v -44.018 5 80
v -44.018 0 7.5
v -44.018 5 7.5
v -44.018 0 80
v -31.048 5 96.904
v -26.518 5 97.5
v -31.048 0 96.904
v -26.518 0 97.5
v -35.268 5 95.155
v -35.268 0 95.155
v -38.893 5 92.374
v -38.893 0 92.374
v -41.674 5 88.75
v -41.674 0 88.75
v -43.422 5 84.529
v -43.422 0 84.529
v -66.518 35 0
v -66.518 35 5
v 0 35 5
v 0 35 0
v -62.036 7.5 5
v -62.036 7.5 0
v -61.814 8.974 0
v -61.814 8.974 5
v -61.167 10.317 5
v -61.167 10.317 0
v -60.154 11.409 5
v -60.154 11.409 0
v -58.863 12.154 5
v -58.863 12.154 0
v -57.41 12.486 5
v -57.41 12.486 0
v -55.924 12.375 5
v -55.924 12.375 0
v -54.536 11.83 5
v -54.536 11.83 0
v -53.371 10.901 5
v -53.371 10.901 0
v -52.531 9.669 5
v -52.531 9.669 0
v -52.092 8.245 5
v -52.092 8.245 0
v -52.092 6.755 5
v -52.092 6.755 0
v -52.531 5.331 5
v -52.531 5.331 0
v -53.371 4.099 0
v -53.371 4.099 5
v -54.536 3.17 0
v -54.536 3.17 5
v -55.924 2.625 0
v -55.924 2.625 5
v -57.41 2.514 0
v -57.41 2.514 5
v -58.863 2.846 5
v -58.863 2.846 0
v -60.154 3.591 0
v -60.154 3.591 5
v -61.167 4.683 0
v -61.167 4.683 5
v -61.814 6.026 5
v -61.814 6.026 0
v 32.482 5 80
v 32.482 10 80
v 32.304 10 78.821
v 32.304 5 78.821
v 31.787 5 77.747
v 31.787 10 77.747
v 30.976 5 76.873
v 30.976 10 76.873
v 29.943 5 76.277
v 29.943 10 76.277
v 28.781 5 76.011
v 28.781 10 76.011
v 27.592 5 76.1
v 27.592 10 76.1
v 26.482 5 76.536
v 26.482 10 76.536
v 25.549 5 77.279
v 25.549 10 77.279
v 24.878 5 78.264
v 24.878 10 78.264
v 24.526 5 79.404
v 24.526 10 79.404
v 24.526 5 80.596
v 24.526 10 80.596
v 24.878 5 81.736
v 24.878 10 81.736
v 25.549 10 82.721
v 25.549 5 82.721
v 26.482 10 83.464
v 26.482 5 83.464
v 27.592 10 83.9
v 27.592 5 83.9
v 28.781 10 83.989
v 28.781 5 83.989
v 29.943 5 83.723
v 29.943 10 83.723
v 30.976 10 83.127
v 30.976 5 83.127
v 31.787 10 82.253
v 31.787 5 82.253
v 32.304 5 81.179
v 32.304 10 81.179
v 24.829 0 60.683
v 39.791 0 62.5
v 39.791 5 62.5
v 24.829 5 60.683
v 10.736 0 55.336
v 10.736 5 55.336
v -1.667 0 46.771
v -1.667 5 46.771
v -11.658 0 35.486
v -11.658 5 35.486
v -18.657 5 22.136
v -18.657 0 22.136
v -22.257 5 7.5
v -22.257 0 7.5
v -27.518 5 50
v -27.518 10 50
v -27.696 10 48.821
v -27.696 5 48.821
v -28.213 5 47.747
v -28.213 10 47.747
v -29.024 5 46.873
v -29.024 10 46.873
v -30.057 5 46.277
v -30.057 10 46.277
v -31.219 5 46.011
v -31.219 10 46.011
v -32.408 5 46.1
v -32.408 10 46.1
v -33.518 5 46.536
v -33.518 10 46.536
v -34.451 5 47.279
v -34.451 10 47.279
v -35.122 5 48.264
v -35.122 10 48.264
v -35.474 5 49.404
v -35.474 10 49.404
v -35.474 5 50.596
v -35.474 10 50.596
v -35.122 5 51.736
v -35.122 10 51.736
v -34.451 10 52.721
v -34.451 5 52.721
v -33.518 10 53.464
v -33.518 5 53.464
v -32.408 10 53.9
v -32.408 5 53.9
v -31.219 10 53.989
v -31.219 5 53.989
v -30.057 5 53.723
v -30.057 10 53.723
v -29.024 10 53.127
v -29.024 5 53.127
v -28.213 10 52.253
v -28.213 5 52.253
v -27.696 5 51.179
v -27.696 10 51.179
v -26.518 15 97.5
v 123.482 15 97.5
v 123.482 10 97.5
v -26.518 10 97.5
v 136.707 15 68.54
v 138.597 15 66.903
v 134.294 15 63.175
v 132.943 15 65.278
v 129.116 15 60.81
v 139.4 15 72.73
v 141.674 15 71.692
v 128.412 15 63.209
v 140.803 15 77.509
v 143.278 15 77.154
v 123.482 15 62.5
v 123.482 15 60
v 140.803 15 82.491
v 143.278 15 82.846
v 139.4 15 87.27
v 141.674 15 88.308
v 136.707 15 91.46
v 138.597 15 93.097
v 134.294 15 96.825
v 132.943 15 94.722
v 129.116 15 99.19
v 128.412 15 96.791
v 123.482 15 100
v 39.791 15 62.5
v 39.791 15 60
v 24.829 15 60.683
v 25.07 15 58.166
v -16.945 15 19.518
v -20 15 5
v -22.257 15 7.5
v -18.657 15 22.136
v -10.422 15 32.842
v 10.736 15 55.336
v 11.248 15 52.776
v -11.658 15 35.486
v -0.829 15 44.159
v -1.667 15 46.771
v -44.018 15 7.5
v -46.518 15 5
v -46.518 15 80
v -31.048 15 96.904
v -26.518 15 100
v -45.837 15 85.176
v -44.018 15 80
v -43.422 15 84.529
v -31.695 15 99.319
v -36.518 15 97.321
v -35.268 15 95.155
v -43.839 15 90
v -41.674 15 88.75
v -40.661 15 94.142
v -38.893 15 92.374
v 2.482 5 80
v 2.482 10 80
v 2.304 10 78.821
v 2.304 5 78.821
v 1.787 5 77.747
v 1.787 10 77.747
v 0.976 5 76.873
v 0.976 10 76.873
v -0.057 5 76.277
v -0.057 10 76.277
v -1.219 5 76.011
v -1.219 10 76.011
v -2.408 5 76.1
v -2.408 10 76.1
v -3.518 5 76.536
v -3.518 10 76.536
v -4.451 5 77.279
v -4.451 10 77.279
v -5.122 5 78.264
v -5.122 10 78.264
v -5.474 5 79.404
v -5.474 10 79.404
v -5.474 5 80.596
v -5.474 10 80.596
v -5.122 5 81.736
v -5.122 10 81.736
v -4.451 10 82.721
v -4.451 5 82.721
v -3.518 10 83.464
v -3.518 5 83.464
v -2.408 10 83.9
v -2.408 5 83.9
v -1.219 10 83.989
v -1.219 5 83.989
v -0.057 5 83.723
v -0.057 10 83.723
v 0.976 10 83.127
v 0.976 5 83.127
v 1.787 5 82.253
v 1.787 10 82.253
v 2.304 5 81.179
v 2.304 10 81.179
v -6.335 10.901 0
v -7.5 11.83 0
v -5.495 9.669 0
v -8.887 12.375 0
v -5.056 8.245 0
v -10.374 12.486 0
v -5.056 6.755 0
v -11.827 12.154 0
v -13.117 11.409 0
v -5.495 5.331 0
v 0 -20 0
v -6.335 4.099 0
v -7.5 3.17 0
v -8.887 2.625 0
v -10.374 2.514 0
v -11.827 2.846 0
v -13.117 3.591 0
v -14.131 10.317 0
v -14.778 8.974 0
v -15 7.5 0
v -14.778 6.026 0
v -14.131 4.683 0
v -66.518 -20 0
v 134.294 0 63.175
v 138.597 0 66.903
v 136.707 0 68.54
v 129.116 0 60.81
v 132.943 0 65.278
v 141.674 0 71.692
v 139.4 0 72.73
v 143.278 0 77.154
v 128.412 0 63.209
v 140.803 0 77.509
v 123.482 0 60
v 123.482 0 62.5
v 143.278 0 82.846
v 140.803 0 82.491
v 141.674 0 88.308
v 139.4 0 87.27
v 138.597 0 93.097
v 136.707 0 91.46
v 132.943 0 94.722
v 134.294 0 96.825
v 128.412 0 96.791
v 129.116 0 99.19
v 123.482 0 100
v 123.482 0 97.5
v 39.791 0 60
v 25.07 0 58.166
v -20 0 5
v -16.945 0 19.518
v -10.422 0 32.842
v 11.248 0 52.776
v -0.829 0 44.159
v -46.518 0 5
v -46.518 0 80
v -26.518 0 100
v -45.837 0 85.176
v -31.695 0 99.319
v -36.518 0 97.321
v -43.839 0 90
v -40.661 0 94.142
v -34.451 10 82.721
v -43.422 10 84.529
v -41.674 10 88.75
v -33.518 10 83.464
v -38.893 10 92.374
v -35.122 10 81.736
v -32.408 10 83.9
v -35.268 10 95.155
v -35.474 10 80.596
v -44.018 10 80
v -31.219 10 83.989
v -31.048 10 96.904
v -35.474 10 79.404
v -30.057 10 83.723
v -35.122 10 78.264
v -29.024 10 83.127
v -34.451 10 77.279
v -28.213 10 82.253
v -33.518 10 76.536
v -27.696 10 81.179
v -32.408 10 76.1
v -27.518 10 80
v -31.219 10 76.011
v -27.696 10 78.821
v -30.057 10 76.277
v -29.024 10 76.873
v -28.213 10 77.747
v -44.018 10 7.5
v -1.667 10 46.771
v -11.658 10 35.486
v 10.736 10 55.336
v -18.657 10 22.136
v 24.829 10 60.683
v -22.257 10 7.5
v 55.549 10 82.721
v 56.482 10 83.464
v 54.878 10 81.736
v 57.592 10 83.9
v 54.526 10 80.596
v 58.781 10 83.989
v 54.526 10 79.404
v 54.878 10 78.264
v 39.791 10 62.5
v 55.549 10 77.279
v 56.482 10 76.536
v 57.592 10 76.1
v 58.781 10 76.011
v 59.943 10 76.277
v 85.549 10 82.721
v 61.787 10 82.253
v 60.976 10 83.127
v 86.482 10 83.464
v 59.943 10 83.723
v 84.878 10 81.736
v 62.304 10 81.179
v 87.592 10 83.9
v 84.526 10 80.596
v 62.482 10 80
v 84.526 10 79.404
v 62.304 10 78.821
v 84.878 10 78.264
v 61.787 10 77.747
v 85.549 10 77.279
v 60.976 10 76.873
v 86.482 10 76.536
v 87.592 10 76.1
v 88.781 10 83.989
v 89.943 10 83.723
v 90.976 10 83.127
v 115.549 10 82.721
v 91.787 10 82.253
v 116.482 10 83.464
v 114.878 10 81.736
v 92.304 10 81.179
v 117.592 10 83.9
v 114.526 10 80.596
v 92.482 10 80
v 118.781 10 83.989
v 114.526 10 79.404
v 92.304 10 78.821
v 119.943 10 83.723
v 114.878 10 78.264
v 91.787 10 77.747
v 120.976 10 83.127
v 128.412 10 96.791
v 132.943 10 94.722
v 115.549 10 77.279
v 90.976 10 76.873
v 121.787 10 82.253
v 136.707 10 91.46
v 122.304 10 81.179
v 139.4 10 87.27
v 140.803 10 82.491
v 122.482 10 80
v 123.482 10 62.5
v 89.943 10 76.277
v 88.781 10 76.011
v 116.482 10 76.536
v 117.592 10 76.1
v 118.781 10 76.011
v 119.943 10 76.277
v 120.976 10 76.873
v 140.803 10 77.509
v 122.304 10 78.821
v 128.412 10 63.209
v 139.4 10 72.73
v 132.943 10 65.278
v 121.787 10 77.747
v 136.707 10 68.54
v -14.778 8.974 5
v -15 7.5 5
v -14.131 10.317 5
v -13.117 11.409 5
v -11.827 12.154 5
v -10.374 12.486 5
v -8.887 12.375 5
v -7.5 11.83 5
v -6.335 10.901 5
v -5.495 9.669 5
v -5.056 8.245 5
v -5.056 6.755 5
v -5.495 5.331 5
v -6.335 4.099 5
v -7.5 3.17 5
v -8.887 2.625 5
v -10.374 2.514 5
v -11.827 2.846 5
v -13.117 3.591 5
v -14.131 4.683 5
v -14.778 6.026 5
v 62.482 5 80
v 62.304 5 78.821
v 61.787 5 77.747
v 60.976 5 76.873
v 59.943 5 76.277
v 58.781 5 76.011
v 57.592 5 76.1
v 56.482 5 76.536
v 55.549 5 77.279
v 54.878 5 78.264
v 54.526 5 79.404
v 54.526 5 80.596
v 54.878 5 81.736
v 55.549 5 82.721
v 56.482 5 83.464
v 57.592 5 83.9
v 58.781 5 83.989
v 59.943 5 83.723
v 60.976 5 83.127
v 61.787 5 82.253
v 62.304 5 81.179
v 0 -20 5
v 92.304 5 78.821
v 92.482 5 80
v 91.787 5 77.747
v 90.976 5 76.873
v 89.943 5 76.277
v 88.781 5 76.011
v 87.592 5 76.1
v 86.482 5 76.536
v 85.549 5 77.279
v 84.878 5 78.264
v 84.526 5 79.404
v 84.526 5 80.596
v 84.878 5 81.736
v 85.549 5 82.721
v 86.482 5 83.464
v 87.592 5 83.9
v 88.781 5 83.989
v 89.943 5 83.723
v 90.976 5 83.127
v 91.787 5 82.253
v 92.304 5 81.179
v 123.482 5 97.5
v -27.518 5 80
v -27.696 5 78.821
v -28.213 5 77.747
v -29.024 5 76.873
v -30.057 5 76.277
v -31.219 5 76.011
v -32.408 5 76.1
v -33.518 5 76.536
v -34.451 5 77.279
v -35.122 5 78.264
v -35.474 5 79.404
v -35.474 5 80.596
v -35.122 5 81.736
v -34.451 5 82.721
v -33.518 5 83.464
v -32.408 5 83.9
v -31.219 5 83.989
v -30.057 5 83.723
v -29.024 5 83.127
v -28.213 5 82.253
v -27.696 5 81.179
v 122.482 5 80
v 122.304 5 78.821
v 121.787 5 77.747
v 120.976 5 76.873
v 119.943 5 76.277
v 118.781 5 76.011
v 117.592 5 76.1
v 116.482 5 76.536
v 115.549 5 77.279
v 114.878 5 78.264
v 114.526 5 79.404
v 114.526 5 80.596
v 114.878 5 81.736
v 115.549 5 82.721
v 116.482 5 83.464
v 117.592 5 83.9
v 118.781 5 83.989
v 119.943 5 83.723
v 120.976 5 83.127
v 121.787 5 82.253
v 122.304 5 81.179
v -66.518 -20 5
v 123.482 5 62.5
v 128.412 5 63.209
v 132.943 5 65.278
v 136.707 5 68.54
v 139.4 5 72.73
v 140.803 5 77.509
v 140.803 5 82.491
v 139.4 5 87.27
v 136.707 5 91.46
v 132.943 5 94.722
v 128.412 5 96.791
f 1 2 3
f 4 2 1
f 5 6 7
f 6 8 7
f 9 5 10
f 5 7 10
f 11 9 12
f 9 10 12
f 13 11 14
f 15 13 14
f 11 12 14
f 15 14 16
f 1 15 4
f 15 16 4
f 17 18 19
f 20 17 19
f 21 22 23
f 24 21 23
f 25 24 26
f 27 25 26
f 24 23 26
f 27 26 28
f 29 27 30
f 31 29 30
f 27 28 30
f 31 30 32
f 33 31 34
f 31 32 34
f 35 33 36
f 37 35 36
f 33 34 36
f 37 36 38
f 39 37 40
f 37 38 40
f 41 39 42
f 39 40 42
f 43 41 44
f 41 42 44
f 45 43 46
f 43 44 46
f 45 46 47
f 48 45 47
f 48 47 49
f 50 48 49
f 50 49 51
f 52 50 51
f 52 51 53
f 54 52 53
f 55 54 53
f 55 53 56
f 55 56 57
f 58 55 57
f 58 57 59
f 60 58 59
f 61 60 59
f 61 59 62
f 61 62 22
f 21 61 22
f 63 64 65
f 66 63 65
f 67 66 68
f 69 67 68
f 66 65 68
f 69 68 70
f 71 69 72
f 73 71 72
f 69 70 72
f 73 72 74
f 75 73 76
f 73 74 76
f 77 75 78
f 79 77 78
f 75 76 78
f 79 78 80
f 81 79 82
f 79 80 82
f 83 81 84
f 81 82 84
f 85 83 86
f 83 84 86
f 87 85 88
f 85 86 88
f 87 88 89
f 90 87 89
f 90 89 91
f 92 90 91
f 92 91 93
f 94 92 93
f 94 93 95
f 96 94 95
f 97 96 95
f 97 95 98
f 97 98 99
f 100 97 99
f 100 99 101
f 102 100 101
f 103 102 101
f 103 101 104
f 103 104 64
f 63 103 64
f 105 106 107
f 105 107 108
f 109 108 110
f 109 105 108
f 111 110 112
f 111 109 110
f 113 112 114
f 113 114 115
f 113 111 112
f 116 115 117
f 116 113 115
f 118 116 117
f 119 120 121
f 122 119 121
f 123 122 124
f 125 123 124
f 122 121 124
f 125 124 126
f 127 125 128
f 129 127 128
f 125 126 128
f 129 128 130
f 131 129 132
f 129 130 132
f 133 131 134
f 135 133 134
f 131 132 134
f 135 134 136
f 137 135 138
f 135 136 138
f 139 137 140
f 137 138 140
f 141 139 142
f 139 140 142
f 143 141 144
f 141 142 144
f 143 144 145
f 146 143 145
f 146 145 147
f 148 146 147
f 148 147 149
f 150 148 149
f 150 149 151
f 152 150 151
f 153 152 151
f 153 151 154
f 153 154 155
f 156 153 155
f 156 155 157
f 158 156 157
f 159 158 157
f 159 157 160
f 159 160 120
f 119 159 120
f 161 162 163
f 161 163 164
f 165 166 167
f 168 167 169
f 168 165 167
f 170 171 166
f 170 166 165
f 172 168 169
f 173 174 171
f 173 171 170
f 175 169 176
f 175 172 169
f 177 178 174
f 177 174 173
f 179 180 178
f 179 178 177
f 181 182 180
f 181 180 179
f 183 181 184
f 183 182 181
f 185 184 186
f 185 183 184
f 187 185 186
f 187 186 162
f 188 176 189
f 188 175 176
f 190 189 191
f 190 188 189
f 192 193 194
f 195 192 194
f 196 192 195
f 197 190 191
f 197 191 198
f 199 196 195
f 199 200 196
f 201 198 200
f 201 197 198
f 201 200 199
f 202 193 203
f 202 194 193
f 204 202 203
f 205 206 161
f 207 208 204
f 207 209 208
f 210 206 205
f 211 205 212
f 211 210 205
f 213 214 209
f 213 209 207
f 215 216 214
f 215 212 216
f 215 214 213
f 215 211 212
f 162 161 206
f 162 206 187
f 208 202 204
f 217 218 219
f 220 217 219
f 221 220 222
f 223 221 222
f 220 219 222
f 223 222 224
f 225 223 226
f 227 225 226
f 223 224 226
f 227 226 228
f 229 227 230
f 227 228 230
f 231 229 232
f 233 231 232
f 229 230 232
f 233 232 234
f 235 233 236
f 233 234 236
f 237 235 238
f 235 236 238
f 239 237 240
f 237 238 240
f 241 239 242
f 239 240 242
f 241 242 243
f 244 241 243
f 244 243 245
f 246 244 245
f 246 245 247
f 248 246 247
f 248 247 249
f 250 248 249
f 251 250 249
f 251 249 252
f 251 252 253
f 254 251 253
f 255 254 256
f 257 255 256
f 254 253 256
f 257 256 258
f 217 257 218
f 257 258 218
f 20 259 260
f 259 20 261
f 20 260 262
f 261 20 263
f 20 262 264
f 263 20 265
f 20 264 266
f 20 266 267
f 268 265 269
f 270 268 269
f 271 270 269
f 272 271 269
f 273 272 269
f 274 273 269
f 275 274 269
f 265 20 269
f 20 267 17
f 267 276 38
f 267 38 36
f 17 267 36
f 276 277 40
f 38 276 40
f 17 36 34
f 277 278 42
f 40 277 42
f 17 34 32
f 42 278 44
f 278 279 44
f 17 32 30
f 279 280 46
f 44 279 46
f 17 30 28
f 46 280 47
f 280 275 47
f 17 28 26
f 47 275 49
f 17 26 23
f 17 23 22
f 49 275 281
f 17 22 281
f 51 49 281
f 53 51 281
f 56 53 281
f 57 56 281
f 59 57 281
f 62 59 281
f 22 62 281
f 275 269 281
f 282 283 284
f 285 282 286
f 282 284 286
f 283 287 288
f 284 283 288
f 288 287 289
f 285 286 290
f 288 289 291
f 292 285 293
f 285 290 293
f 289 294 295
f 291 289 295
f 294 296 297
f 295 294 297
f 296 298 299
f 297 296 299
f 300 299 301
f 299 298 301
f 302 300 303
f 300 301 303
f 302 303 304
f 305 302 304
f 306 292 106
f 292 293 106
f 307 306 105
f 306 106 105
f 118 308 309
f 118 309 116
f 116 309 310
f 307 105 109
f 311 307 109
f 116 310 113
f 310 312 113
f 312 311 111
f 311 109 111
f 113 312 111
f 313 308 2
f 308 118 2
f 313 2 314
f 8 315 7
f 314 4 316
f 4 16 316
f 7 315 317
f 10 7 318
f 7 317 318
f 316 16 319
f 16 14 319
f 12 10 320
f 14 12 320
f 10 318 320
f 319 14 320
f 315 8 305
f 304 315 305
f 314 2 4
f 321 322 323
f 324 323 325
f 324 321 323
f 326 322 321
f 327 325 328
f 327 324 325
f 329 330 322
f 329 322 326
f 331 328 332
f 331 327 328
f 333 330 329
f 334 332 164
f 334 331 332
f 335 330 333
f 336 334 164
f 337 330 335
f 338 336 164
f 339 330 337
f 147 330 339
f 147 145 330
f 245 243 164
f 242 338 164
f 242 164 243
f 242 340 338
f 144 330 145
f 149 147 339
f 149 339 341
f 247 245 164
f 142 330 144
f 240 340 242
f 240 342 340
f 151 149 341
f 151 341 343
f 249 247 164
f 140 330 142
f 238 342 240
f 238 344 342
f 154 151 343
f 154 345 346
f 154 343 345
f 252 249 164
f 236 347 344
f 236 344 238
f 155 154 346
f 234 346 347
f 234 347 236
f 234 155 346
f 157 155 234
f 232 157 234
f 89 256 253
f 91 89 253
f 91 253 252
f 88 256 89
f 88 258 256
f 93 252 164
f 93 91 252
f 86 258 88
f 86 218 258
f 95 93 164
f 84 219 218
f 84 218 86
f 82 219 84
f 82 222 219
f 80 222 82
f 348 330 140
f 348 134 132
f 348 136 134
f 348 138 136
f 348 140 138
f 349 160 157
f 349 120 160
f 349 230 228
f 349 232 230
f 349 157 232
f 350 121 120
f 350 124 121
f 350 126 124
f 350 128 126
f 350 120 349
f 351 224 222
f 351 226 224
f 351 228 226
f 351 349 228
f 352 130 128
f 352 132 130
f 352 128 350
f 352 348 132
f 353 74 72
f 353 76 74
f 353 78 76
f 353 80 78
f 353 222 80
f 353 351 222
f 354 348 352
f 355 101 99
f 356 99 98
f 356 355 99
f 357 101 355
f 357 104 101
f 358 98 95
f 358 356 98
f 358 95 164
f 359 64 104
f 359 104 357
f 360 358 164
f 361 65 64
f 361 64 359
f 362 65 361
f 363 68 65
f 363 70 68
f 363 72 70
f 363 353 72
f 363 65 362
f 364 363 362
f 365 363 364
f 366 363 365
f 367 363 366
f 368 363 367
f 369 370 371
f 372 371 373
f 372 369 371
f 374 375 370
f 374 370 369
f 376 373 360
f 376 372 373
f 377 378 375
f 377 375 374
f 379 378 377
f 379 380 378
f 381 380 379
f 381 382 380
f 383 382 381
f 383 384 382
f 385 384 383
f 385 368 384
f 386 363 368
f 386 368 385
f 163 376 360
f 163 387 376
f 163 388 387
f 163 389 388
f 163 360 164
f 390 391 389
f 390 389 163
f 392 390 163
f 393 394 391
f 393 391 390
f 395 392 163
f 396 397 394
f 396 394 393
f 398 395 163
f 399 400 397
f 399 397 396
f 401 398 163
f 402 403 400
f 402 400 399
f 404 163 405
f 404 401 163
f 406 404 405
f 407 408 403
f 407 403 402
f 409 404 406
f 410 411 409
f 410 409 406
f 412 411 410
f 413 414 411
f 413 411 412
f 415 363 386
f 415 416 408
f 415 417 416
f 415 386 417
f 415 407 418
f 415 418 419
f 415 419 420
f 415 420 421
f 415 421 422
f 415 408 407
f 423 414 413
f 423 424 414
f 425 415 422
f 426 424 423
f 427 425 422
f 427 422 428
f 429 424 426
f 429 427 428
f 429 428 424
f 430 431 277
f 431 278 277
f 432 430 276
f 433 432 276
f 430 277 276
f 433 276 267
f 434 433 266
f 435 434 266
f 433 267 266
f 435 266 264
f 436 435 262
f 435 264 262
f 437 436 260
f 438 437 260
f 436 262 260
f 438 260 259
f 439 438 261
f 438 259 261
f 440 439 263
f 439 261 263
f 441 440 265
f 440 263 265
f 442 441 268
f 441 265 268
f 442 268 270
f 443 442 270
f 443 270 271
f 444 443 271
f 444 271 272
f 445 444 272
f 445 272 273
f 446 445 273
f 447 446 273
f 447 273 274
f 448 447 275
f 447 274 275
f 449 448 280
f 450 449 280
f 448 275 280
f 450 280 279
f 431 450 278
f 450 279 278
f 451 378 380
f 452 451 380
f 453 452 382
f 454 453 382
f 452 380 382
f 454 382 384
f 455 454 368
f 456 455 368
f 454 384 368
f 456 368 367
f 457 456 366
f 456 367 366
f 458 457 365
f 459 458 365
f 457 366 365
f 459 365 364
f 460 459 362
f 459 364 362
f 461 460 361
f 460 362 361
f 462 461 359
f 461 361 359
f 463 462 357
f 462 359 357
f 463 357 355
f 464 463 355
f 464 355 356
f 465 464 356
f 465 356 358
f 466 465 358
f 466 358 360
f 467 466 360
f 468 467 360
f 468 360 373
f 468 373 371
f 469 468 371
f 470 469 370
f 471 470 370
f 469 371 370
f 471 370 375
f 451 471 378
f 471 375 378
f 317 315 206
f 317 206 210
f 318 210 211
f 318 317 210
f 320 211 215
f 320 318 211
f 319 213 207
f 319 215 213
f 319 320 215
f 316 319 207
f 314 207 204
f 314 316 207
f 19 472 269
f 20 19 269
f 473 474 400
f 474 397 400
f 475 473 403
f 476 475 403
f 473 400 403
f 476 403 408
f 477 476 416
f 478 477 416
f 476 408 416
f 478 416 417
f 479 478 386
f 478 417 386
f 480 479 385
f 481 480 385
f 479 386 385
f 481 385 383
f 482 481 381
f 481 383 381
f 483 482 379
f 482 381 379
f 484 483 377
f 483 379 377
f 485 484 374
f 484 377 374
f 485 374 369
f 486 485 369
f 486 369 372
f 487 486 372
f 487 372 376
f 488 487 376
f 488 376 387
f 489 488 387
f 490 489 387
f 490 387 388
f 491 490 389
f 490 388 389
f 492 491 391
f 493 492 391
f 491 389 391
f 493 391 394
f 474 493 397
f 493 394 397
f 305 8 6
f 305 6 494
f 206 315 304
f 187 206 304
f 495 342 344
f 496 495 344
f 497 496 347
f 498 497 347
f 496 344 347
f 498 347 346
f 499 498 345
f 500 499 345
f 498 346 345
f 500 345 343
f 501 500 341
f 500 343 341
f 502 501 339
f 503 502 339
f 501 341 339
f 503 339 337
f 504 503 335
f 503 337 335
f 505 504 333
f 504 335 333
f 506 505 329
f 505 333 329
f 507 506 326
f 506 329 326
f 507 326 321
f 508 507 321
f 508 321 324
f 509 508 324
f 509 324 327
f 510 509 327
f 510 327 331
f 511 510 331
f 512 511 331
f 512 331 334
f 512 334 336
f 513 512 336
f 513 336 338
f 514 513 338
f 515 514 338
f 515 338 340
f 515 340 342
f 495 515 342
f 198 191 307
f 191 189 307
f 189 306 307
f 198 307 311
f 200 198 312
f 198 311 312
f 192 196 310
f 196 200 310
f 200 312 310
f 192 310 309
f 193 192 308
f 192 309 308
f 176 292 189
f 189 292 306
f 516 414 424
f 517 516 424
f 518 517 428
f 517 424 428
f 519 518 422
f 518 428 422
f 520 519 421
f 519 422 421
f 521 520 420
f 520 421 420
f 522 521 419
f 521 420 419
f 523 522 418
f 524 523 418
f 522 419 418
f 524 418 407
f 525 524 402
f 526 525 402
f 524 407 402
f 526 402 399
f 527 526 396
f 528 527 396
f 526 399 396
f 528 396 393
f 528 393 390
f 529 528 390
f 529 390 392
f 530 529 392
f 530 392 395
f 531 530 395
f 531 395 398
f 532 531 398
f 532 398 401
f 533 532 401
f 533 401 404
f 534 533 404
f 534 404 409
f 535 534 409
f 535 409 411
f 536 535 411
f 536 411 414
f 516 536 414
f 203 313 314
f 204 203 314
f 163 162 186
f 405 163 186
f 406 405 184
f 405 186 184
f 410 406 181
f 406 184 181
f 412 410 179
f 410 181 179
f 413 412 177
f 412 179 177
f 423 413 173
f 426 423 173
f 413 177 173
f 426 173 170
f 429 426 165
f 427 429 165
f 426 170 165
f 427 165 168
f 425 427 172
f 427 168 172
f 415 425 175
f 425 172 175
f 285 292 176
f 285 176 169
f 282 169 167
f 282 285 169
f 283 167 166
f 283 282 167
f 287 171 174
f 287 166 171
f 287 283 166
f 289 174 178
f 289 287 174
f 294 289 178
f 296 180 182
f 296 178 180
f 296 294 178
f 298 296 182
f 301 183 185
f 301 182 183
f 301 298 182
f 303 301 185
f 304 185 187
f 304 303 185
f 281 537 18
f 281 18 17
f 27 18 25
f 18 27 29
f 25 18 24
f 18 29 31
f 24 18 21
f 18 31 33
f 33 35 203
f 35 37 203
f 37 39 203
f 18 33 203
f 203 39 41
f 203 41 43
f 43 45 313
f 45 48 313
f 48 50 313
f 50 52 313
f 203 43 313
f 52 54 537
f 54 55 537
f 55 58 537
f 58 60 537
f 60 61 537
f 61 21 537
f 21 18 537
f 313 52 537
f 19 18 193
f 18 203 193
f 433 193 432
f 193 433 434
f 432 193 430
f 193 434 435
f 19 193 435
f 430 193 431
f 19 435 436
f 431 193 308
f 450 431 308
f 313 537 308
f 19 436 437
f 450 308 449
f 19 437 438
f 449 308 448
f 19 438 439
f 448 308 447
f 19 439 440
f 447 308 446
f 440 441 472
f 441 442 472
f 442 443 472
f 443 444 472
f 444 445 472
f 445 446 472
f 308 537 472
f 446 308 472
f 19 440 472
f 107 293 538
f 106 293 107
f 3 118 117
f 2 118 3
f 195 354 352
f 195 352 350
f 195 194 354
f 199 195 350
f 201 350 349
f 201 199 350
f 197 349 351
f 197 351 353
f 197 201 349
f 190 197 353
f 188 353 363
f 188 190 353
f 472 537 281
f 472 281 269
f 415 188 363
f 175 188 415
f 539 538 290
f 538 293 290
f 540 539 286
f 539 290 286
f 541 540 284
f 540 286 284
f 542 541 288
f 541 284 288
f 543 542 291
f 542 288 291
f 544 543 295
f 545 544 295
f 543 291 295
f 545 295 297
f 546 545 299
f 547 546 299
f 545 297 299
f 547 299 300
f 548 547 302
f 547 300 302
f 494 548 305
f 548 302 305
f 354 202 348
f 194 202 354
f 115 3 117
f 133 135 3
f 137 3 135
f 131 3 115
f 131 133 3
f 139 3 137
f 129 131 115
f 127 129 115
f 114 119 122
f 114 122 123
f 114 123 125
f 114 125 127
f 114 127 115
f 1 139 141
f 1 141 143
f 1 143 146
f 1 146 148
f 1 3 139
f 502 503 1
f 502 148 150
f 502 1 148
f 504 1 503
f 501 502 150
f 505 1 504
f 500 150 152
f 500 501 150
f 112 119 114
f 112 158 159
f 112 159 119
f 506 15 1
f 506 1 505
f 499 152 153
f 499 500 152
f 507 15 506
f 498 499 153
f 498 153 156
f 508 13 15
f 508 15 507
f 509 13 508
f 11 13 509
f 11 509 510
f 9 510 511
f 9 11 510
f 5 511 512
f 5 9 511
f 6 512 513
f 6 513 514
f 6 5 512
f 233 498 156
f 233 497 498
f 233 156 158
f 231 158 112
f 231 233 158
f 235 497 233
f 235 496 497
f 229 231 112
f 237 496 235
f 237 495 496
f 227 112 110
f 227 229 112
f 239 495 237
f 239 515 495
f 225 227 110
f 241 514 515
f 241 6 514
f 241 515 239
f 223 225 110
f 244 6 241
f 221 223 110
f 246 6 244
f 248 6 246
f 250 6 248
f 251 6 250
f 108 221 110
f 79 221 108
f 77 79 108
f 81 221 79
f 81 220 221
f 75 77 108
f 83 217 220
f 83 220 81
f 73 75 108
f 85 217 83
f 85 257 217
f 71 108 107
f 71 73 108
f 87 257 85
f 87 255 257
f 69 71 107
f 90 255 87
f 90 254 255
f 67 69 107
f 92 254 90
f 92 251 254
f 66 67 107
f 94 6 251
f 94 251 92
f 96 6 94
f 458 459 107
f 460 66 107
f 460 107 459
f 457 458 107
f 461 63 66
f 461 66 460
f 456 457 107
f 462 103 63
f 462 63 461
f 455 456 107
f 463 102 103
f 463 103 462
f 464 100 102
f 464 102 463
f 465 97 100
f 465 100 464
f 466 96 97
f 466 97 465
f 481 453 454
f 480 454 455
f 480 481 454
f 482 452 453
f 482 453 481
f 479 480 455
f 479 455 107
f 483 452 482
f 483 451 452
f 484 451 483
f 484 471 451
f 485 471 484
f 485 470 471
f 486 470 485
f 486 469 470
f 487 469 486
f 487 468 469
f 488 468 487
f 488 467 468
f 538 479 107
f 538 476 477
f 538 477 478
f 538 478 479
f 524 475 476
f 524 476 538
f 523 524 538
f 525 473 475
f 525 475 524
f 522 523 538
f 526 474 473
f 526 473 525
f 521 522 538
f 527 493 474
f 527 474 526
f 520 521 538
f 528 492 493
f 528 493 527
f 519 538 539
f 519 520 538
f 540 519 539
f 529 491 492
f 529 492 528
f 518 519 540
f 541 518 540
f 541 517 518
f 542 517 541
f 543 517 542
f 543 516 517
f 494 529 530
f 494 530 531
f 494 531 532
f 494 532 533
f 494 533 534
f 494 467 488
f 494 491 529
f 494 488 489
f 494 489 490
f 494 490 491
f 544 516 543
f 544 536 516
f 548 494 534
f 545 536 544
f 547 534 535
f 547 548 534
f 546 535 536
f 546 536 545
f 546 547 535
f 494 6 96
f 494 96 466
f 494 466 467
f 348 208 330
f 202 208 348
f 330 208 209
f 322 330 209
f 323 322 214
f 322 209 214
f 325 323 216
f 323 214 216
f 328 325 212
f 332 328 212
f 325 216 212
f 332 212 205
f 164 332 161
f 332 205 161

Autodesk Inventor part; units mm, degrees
ref_plane "YZ Plane" through (0, 0, 0) normal (1, 0, 0) x (0, 1, 0)
ref_plane "XZ Plane" through (0, 0, 0) normal (0, 1, 0) x (-1, 0, 0)
ref_plane "XY Plane" through (0, 0, 0) normal (0, 0, 1) x (1, 0, 0)
sketch "Sketch1" plane through (0, 0, 0) normal (0, 1, 0) x (-1, 0, 0)
  line L0 (0, 0) -> (80, 0)
  line L1 (20, 5) -> (0, 5)
  line L2 (0, 5) -> (0, 0)
  line L3 (46.5184, 5) -> (46.5184, 80)
  circle A0 centre (26.5184, 80) radius 20
  line L4 (26.5184, 100) -> (-123.4816, 100)
  circle A1 centre (-123.4816, 80) radius 20
  line L5 (-123.4816, 60) -> (-39.7913, 60)
  arc A2 (20, 5) -> (-39.7913, 60) centre (-39.7913, 0) ccw
  line L6 (46.5184, 5) -> (66.5184, 5)
  line L7 (66.5184, 5) -> (66.5184, 0)
  line L8 (66.5184, 0) -> (46.5184, 0)
  point P0 (16.5184, 60)
  dimension "d1" = 75
  dimension "d2" = 40
  dimension "d3" = 150
  dimension "d4" = 140
  dimension "d7" = 40
  dimension "d10" = 5
  dimension "d11" = 5
extrude "Extrusion1" add sketch "Sketch1" along normal blind 15
sketch "Sketch4" plane through (0, 0, 0) normal (0, -1, 0) x (1, 0, 0)
  line L0 (-26.5184, 100) -> (123.4816, 100) projected
  arc A0 (-26.5184, 100) -> (-46.5184, 80) centre (-26.5184, 80) ccw projected
  line L1 (-46.5184, 5) -> (-46.5184, 80) projected
  line L2 (-66.5184, 5) -> (-46.5184, 5) projected
  line L3 (-66.5184, 0) -> (-66.5184, 5) projected
  line L4 (0, 0) -> (-66.5184, 0) projected
  line L5 (0, 5) -> (0, 0) projected
  line L6 (-20, 5) -> (0, 5) projected
  arc A1 (39.7913, 60) -> (-20, 5) centre (39.7913, 0) ccw projected
  line L7 (123.4816, 60) -> (39.7913, 60) projected
  arc A2 (123.4816, 60) -> (123.4816, 100) centre (123.4816, 80) ccw projected
  line L8 (-20, 5) -> (-46.5184, 5)
extrude "Extrusion3" add sketch "Sketch4" along normal blind 20 and the other way blind 35 contours L8 L6 L5 L4 L3 L2
sketch "Sketch5" plane through (0, 0, 0) normal (0, -1, 0) x (1, 0, 0)
  line L0 (-46.5184, 5) -> (-20, 5) projected
  arc A0 (39.7913, 60) -> (-20, 5) centre (39.7913, 0) ccw projected
  line L1 (123.4816, 60) -> (39.7913, 60) projected
  arc A1 (123.4816, 60) -> (123.4816, 100) centre (123.4816, 80) ccw projected
  line L2 (-26.5184, 100) -> (123.4816, 100) projected
  arc A2 (-26.5184, 100) -> (-46.5184, 80) centre (-26.5184, 80) ccw projected
  line L3 (-46.5184, 5) -> (-46.5184, 80) projected
  arc A3 (39.7913, 62.5) -> (-22.2571, 7.5) centre (39.7913, 0) ccw
  line L4 (-22.2571, 7.5) -> (-44.0184, 7.5)
  line L5 (-44.0184, 7.5) -> (-44.0184, 80)
  arc A4 (-26.5184, 97.5) -> (-44.0184, 80) centre (-26.5184, 80) ccw
  line L6 (-26.5184, 97.5) -> (123.4816, 97.5)
  arc A5 (123.4816, 62.5) -> (123.4816, 97.5) centre (123.4816, 80) ccw
  line L7 (123.4816, 62.5) -> (39.7913, 62.5)
  point P0 (0, 0)
  dimension "d29" = 2.5
extrude "Extrusion4" cut sketch "Sketch5" against normal blind 5 contours A3 L4 L5 A4 L6 A5 L7
sketch "Sketch6" plane through (0, 15, 0) normal (0, 1, 0) x (1, 0, 0)
  line L0 (-20, -5) -> (-46.5184, -5) projected
  line L1 (-46.5184, -5) -> (-46.5184, -80) projected
  arc A0 (-46.5184, -80) -> (-26.5184, -100) centre (-26.5184, -80) ccw projected
  line L2 (-26.5184, -100) -> (123.4816, -100) projected
  arc A1 (123.4816, -100) -> (123.4816, -60) centre (123.4816, -80) ccw projected
  line L3 (123.4816, -60) -> (39.7913, -60) projected
  arc A2 (-20, -5) -> (39.7913, -60) centre (39.7913, 0) ccw projected
  line L4 (-44.0184, -80) -> (-44.0184, -7.5)
  line L5 (-44.0184, -7.5) -> (-22.2571, -7.5)
  arc A3 (-22.2571, -7.5) -> (39.7913, -62.5) centre (39.7913, 0) ccw
  line L6 (39.7913, -62.5) -> (123.4816, -62.5)
  arc A4 (123.4816, -97.5) -> (123.4816, -62.5) centre (123.4816, -80) ccw
  line L7 (123.4816, -97.5) -> (-26.5184, -97.5)
  arc A5 (-44.0184, -80) -> (-26.5184, -97.5) centre (-26.5184, -80) ccw
  point P0 (0, 0)
  dimension "d32" = 2.5
extrude "Extrusion5" cut sketch "Sketch6" against normal blind 5 contours L4 L5 A3 L6 A4 L7 A5
sketch "Sketch7" plane through (0, 10, 0) normal (0, 1, 0) x (1, 0, 0)
  line L0 (123.4816, -97.5) -> (-26.5184, -97.5) projected
  line L1 (39.7913, -62.5) -> (123.4816, -62.5) projected
  line L2 (123.4816, -62.5) -> (39.7913, -62.5) projected
  line L3 (118.4816, -62.5) -> (118.4816, -80)
  circle A0 centre (118.4816, -80) radius 4
  line L4 (-44.0184, -80) -> (-44.0184, -7.5) projected
  circle A1 centre (88.4816, -80) radius 4
  circle A2 centre (58.4816, -80) radius 4
  circle A3 centre (28.4816, -80) radius 4
  circle A4 centre (-1.5184, -80) radius 4
  circle A5 centre (-31.5184, -80) radius 4
  arc A6 (123.4816, -97.5) -> (123.4816, -62.5) centre (123.4816, -80) ccw projected
  circle A7 centre (-31.5184, -50) radius 4
  point P0 (0, 0)
  dimension "d35" = 35
  dimension "d36" = 17.5
  dimension "d37" = 8
  dimension "d39" = 8
  dimension "d41" = 8
  dimension "d43" = 8
  dimension "d45" = 8
  dimension "d46" = 8
  dimension "d47" = 30
  dimension "d48" = 30
  dimension "d49" = 30
  dimension "d50" = 30
  dimension "d51" = 5
  dimension "d52" = 30
  dimension "d53" = 8
  dimension "d54" = 30
extrude "Extrusion6" cut sketch "Sketch7" against normal blind 8
sketch "Sketch8" plane through (0, 35, 0) normal (0, 0, -1) x (-1, 0, 0)
  line L0 (20, -20) -> (46.5184, -20) projected
  line L1 (46.5184, -35) -> (20, -35) projected
  line L2 (20, -35) -> (20, -20) projected
  line L3 (46.5184, -35) -> (46.5184, -20) projected
  line L4 (0, 0) -> (66.5184, 0) projected
  line L5 (66.5184, -55) -> (0, -55) projected
  circle A0 centre (10, -27.5) radius 5
  circle A1 centre (57.0363, -27.5) radius 5
  point P0 (0, -35)
  dimension "d57" = 20
  dimension "d58" = 20
  dimension "d59" = 10
  dimension "d60" = 10
  dimension "d61" = 10
extrude "Extrusion7" cut sketch "Sketch8" against normal blind 10 contours A0 | A1
equation "\"d55\" = d39"
properties part number "Pylon2"
